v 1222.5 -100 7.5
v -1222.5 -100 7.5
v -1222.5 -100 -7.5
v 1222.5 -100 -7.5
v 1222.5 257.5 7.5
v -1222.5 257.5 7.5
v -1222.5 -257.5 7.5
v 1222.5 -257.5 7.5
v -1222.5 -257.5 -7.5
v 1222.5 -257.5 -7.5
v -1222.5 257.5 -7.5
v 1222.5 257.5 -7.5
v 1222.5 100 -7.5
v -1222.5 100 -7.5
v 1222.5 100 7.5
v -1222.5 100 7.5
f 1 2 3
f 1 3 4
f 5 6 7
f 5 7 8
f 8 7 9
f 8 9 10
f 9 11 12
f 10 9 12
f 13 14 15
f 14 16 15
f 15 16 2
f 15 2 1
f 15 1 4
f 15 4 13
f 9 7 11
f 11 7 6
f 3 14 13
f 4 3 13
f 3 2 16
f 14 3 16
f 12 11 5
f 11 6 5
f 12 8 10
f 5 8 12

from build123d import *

# Parameters (mm, degrees)
F0_W     = 2445
F0_H     = 515
F1_DEPTH = 7.5
F2_W     = 2445
F2_H     = 200
F3_DEPTH = 7.5


with BuildPart() as f1:
    # F0 (on Top) → F1 (new body, symmetric)
    with BuildSketch(Plane.XY):
        Rectangle(F0_W, F0_H)
    extrude(amount=F1_DEPTH, both=True)


with BuildPart() as f3:
    # F2 (on Top) → F3 (new body, symmetric)
    with BuildSketch(Plane.XY):
        Rectangle(F2_W, F2_H)
    extrude(amount=F3_DEPTH, both=True)


solid = Compound([f1.part, f3.part])
